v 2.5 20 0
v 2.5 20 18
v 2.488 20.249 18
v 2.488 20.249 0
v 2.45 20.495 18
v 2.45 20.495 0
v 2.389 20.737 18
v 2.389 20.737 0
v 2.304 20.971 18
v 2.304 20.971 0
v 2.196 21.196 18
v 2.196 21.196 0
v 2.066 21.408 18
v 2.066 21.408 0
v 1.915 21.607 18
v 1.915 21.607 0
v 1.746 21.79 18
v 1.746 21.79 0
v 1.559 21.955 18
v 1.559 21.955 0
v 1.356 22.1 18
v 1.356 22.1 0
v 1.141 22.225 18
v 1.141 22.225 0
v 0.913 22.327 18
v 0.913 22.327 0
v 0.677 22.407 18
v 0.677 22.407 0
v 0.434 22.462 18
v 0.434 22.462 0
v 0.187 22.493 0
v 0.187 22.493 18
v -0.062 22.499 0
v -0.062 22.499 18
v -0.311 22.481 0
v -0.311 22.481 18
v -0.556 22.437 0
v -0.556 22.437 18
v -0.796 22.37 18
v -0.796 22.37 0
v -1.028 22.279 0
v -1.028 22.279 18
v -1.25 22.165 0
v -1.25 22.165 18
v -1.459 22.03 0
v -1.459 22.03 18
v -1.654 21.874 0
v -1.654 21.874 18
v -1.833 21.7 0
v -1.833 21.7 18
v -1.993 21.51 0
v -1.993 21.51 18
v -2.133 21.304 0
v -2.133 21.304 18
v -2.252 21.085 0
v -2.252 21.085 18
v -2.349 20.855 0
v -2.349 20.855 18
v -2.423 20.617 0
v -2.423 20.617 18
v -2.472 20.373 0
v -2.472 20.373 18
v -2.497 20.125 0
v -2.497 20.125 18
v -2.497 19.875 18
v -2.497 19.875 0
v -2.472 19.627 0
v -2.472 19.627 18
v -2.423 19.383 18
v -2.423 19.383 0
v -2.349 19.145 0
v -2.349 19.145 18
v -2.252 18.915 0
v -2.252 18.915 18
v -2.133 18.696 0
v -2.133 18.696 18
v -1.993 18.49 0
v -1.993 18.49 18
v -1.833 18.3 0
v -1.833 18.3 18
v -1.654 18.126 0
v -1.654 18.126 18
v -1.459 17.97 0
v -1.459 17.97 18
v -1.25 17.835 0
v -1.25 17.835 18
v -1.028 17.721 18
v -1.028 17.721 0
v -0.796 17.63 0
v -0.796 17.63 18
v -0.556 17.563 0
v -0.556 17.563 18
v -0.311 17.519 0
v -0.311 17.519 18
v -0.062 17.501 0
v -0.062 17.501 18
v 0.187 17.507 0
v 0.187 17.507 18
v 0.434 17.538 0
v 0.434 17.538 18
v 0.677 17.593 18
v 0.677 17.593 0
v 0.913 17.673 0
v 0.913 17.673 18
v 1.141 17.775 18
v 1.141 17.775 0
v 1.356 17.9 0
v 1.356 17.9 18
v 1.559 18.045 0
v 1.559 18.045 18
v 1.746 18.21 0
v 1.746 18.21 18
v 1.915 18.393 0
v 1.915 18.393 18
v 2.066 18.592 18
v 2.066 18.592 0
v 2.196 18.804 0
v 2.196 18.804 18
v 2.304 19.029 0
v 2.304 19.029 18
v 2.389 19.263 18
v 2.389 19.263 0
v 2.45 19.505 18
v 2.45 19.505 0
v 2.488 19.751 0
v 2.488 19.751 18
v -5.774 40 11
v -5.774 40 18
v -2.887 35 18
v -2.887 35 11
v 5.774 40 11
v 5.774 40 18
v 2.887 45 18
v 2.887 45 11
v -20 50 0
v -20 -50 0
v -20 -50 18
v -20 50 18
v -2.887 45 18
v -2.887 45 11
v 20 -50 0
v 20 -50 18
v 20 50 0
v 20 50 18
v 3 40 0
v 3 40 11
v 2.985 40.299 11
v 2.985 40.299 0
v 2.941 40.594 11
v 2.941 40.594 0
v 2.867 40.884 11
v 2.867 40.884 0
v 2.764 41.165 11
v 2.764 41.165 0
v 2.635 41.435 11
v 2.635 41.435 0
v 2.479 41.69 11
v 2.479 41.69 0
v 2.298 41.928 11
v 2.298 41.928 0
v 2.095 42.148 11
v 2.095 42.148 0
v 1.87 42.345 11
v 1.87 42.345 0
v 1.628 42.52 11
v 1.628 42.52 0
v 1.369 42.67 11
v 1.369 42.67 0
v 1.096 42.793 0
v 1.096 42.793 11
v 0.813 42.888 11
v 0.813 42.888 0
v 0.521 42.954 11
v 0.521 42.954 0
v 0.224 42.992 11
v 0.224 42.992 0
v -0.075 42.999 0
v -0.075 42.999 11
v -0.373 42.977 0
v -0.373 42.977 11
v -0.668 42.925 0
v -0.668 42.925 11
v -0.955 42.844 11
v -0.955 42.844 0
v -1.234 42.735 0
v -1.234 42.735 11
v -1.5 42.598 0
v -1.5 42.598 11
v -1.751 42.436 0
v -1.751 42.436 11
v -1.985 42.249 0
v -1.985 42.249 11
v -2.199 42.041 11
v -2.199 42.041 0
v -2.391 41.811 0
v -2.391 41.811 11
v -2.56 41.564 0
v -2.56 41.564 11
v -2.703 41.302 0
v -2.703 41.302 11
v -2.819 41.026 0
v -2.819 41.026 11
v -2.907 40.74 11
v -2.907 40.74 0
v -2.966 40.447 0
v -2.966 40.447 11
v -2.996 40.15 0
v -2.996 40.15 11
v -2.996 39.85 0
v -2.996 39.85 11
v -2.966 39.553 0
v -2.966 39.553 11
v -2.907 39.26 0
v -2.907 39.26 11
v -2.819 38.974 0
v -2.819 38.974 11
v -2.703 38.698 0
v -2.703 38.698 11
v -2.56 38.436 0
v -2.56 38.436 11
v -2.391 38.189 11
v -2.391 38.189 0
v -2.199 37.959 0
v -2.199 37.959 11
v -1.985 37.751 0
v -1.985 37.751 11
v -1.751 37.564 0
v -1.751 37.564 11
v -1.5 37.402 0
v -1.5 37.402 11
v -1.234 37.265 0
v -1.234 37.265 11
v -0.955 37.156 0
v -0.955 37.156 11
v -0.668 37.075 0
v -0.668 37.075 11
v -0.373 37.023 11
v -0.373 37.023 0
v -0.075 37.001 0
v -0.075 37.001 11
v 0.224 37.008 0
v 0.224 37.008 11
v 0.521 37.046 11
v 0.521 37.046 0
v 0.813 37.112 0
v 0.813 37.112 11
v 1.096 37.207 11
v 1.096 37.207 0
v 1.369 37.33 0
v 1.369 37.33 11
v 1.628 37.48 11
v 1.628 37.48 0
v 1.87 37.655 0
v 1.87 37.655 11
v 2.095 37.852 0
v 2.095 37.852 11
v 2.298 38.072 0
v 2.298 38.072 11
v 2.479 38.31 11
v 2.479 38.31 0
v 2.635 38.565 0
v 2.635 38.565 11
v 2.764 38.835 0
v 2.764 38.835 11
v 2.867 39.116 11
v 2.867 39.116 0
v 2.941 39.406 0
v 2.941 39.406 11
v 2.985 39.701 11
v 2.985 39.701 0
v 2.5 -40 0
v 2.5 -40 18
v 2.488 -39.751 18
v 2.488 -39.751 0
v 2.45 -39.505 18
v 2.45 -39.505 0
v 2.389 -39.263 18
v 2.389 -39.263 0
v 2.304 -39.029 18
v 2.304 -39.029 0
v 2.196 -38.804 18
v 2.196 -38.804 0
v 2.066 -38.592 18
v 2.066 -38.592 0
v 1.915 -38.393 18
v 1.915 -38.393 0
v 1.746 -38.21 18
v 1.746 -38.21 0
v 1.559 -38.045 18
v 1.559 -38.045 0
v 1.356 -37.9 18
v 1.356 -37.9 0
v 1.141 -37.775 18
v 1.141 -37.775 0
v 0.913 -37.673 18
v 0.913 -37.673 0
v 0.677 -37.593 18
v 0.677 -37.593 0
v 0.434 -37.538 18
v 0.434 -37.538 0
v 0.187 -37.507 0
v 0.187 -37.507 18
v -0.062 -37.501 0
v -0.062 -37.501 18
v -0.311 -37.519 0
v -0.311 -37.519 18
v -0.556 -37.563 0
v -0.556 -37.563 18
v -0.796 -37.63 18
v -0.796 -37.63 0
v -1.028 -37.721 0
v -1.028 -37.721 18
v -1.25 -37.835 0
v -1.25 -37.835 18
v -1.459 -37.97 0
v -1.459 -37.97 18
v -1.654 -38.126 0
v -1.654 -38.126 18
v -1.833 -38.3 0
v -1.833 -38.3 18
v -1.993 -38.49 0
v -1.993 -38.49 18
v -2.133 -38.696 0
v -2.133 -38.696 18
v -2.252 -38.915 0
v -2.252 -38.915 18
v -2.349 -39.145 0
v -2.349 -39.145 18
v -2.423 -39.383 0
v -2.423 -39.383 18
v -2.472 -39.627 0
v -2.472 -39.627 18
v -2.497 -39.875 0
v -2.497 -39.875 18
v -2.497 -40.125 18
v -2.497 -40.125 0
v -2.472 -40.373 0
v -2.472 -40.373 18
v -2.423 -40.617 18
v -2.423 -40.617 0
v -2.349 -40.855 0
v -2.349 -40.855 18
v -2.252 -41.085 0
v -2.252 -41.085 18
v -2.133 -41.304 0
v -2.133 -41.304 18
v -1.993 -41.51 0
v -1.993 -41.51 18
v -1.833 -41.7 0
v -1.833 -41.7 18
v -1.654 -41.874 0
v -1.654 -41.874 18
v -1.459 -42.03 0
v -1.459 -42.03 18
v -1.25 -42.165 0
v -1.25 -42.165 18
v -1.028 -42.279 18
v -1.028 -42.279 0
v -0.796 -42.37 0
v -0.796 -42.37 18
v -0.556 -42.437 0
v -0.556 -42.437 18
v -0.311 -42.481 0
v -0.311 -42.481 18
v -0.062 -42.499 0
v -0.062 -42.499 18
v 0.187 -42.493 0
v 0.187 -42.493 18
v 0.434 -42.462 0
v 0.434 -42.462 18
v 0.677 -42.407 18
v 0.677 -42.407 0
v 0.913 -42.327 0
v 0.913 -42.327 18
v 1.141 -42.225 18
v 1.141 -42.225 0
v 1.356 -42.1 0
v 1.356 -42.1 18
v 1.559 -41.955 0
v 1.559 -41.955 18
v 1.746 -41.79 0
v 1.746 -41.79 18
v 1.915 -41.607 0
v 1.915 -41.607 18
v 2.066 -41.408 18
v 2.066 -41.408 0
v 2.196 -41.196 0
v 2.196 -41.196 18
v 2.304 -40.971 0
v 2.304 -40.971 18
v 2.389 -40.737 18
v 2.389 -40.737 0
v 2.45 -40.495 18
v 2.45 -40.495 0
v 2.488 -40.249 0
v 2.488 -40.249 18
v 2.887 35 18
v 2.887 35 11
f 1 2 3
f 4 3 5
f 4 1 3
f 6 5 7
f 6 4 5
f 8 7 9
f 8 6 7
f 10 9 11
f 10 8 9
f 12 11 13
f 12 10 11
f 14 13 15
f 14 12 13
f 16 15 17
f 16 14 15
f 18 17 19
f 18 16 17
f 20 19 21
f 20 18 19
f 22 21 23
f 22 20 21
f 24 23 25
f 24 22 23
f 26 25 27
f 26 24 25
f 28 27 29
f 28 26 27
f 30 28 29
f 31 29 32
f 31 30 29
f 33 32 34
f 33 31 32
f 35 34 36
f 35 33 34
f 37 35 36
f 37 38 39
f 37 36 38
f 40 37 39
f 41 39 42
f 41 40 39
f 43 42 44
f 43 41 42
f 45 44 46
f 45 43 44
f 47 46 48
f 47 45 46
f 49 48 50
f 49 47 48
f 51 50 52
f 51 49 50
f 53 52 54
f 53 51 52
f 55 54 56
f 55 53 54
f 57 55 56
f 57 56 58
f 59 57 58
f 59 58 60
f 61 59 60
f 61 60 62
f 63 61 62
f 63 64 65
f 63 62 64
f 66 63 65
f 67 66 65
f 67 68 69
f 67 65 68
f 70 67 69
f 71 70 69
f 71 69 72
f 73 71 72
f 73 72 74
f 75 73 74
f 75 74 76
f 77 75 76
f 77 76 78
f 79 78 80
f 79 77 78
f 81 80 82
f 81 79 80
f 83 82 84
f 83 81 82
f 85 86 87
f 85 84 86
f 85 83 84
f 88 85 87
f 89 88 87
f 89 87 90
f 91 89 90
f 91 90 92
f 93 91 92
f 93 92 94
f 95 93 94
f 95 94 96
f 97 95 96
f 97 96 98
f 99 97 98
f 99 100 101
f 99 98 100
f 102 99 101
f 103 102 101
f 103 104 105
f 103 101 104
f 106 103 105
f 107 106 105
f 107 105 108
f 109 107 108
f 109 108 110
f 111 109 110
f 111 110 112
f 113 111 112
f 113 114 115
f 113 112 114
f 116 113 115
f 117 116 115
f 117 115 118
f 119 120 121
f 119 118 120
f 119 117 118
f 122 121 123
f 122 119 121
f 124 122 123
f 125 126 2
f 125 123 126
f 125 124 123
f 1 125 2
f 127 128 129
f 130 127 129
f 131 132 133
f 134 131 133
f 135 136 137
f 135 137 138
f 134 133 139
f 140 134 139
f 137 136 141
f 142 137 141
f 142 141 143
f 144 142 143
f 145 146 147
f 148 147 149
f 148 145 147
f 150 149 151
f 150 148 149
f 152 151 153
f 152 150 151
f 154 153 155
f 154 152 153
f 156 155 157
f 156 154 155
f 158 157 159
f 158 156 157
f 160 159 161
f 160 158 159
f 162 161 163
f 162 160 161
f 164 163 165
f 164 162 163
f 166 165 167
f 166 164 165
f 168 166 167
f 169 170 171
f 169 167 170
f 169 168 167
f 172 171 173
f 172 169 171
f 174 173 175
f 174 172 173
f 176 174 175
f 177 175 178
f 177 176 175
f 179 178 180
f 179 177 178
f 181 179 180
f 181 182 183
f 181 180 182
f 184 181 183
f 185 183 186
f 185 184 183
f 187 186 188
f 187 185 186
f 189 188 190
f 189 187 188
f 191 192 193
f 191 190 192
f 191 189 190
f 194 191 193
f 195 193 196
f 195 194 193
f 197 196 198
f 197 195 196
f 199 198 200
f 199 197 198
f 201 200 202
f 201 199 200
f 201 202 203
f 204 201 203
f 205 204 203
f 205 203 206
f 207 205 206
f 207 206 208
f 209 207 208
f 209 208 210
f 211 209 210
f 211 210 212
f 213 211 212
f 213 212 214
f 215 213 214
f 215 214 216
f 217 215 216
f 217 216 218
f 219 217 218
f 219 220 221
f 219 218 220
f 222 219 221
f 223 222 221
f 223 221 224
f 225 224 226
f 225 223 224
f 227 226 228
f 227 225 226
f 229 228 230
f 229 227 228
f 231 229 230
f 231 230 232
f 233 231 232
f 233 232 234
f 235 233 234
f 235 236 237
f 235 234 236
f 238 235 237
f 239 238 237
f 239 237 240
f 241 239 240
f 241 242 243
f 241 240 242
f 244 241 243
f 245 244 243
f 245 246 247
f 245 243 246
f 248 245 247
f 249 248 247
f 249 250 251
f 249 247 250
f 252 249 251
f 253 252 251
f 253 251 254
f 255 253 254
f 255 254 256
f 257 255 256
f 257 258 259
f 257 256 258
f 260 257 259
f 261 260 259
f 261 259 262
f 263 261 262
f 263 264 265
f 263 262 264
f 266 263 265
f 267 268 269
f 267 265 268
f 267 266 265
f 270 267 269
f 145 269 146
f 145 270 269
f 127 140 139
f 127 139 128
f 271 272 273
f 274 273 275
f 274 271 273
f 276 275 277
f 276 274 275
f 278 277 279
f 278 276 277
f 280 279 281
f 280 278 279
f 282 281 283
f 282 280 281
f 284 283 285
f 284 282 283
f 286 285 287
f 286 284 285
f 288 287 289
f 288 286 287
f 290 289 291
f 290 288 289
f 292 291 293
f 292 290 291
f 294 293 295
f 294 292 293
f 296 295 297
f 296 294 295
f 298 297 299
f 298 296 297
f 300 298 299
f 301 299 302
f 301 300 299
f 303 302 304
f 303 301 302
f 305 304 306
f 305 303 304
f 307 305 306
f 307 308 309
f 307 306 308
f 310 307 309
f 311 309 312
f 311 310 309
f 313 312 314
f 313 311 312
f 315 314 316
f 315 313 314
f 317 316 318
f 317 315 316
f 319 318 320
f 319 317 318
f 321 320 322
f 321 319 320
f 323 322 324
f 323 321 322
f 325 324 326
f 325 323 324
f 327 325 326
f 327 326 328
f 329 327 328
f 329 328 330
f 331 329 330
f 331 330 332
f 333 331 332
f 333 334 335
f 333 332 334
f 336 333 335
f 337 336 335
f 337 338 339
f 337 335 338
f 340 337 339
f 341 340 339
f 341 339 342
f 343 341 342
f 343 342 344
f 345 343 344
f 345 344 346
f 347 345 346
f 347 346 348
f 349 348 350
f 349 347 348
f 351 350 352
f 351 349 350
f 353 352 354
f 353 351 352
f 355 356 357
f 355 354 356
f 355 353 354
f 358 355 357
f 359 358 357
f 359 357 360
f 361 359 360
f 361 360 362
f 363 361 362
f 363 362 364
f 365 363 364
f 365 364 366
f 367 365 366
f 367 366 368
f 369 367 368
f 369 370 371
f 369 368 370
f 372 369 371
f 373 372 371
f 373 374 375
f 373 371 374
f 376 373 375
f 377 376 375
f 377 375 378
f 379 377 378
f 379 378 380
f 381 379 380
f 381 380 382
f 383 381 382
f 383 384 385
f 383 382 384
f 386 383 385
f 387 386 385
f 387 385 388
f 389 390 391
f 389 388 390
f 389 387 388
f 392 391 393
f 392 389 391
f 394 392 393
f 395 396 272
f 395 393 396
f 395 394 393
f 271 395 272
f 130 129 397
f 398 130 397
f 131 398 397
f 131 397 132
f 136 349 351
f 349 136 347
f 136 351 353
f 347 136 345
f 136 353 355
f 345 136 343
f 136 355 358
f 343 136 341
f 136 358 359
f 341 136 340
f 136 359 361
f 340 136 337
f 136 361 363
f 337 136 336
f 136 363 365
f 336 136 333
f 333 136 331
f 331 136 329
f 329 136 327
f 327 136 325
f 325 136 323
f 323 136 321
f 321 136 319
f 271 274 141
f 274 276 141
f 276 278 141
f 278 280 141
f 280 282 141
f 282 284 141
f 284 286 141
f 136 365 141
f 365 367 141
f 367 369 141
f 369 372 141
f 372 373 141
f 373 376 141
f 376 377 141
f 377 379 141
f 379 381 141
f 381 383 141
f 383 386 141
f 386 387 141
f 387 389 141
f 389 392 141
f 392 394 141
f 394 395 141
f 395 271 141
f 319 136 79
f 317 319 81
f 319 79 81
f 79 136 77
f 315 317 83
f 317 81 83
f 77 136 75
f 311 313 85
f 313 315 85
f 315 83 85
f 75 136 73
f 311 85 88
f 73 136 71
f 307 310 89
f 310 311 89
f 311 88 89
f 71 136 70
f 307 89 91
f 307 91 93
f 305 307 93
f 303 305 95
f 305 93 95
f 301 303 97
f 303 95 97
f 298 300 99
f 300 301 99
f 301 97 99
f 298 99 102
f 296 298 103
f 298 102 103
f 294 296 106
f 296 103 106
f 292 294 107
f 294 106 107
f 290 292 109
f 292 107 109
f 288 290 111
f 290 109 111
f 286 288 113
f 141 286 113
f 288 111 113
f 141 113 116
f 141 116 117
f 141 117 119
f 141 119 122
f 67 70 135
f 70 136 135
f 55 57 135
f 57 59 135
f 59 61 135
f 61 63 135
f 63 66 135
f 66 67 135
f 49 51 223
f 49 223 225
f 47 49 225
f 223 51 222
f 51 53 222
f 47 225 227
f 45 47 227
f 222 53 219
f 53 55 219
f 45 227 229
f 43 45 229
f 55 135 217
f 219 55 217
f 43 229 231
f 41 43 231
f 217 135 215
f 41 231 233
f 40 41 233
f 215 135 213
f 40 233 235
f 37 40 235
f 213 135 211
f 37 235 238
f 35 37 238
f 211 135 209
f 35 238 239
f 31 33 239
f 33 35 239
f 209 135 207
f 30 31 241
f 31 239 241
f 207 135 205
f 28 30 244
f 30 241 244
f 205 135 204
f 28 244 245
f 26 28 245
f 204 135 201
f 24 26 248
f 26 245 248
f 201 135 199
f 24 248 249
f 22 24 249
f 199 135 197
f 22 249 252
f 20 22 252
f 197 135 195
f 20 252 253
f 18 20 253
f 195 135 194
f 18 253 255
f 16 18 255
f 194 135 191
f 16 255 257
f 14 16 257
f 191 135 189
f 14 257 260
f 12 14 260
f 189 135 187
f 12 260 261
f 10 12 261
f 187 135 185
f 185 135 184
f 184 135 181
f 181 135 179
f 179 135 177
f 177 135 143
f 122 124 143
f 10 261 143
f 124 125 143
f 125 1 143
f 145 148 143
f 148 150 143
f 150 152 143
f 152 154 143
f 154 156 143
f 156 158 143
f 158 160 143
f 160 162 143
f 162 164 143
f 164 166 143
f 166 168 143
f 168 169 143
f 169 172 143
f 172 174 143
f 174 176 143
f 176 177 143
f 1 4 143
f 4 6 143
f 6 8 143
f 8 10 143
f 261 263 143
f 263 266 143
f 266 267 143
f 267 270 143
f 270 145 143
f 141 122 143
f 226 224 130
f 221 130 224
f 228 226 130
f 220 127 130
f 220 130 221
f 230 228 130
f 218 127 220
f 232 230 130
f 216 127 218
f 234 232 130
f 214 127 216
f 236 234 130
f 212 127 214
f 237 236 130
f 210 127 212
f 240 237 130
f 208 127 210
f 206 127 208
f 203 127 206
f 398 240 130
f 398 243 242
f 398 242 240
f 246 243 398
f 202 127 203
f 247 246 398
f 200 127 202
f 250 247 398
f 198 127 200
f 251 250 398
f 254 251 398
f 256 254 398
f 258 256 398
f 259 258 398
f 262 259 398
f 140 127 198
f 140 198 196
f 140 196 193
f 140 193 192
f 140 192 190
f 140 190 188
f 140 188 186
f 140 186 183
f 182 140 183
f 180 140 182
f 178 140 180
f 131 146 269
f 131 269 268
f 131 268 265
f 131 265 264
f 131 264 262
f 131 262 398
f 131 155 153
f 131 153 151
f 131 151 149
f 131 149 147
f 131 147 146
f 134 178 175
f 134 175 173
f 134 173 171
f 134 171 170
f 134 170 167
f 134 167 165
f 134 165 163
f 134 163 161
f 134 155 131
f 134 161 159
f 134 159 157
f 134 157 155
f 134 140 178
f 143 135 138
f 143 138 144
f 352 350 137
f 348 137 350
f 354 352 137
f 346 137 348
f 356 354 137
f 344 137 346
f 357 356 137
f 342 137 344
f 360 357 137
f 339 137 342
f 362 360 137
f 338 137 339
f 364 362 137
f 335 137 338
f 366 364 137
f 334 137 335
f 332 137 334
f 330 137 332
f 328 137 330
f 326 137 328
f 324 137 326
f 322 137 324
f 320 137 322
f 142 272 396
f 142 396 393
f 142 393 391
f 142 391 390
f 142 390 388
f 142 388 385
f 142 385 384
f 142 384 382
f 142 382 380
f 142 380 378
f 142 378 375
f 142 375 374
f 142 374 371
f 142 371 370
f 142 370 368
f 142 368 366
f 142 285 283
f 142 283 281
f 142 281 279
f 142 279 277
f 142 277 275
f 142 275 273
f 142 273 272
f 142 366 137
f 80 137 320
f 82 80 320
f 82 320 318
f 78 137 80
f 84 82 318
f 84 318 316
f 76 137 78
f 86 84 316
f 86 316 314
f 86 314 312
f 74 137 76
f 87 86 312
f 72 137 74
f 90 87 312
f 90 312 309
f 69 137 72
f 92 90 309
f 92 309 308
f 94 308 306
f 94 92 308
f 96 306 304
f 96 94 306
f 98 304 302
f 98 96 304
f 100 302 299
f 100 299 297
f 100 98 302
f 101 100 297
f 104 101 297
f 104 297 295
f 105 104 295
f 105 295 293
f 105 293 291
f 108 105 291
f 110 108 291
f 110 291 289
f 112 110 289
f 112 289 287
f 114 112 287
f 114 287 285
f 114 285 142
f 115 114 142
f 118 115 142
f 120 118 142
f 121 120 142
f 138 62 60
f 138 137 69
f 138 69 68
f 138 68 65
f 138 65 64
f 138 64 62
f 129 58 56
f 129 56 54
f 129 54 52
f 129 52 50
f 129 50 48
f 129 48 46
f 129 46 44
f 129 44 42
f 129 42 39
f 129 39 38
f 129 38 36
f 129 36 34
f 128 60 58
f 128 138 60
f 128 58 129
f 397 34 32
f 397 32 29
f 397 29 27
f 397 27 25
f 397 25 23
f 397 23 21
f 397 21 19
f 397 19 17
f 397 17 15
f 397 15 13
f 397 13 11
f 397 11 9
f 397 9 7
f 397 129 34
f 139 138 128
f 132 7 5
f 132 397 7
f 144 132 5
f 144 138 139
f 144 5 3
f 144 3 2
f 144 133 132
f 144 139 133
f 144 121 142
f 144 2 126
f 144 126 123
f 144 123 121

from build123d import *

# Parameters (mm, degrees)
SKETCH062_W          = 40
SKETCH062_H          = 100
PAD005_DEPTH         = 18
SKETCH063_R          = 3
SKETCH063_R_2        = 2.5
POCKET035_DEPTH      = 0.001
POCKET035_DEPTH_BACK = 18.001
POCKET041_DEPTH      = 7


with BuildPart() as part:
    # Sketch062 → Pad005 (new body)
    with BuildSketch(Plane.XY):
        Rectangle(SKETCH062_W, SKETCH062_H)
    extrude(amount=PAD005_DEPTH)

    # Sketch063 → Pocket035 (cut, two sides)
    with BuildSketch(Plane.XY) as pocket035_sk:
        with Locations((0, 40)):
            Circle(SKETCH063_R)
        with Locations((0, 20)):
            Circle(SKETCH063_R_2)
        with Locations((0, -40)):
            Circle(SKETCH063_R_2)
    extrude(amount=-POCKET035_DEPTH, mode=Mode.SUBTRACT)
    extrude(pocket035_sk.sketch, amount=POCKET035_DEPTH_BACK, mode=Mode.SUBTRACT)

    # Sketch092 → Pocket041 (cut)
    with BuildSketch(Plane(origin=(0, 40, 18), x_dir=(1, 0, 0), z_dir=(0, 0, 1))):
        Polygon((5.773503, 0), (2.886751, 5), (-2.886751, 5), (-5.773503, 0), (-2.886751, -5), (2.886751, -5), align=None)
    extrude(amount=-POCKET041_DEPTH, mode=Mode.SUBTRACT)


solid = part.part
